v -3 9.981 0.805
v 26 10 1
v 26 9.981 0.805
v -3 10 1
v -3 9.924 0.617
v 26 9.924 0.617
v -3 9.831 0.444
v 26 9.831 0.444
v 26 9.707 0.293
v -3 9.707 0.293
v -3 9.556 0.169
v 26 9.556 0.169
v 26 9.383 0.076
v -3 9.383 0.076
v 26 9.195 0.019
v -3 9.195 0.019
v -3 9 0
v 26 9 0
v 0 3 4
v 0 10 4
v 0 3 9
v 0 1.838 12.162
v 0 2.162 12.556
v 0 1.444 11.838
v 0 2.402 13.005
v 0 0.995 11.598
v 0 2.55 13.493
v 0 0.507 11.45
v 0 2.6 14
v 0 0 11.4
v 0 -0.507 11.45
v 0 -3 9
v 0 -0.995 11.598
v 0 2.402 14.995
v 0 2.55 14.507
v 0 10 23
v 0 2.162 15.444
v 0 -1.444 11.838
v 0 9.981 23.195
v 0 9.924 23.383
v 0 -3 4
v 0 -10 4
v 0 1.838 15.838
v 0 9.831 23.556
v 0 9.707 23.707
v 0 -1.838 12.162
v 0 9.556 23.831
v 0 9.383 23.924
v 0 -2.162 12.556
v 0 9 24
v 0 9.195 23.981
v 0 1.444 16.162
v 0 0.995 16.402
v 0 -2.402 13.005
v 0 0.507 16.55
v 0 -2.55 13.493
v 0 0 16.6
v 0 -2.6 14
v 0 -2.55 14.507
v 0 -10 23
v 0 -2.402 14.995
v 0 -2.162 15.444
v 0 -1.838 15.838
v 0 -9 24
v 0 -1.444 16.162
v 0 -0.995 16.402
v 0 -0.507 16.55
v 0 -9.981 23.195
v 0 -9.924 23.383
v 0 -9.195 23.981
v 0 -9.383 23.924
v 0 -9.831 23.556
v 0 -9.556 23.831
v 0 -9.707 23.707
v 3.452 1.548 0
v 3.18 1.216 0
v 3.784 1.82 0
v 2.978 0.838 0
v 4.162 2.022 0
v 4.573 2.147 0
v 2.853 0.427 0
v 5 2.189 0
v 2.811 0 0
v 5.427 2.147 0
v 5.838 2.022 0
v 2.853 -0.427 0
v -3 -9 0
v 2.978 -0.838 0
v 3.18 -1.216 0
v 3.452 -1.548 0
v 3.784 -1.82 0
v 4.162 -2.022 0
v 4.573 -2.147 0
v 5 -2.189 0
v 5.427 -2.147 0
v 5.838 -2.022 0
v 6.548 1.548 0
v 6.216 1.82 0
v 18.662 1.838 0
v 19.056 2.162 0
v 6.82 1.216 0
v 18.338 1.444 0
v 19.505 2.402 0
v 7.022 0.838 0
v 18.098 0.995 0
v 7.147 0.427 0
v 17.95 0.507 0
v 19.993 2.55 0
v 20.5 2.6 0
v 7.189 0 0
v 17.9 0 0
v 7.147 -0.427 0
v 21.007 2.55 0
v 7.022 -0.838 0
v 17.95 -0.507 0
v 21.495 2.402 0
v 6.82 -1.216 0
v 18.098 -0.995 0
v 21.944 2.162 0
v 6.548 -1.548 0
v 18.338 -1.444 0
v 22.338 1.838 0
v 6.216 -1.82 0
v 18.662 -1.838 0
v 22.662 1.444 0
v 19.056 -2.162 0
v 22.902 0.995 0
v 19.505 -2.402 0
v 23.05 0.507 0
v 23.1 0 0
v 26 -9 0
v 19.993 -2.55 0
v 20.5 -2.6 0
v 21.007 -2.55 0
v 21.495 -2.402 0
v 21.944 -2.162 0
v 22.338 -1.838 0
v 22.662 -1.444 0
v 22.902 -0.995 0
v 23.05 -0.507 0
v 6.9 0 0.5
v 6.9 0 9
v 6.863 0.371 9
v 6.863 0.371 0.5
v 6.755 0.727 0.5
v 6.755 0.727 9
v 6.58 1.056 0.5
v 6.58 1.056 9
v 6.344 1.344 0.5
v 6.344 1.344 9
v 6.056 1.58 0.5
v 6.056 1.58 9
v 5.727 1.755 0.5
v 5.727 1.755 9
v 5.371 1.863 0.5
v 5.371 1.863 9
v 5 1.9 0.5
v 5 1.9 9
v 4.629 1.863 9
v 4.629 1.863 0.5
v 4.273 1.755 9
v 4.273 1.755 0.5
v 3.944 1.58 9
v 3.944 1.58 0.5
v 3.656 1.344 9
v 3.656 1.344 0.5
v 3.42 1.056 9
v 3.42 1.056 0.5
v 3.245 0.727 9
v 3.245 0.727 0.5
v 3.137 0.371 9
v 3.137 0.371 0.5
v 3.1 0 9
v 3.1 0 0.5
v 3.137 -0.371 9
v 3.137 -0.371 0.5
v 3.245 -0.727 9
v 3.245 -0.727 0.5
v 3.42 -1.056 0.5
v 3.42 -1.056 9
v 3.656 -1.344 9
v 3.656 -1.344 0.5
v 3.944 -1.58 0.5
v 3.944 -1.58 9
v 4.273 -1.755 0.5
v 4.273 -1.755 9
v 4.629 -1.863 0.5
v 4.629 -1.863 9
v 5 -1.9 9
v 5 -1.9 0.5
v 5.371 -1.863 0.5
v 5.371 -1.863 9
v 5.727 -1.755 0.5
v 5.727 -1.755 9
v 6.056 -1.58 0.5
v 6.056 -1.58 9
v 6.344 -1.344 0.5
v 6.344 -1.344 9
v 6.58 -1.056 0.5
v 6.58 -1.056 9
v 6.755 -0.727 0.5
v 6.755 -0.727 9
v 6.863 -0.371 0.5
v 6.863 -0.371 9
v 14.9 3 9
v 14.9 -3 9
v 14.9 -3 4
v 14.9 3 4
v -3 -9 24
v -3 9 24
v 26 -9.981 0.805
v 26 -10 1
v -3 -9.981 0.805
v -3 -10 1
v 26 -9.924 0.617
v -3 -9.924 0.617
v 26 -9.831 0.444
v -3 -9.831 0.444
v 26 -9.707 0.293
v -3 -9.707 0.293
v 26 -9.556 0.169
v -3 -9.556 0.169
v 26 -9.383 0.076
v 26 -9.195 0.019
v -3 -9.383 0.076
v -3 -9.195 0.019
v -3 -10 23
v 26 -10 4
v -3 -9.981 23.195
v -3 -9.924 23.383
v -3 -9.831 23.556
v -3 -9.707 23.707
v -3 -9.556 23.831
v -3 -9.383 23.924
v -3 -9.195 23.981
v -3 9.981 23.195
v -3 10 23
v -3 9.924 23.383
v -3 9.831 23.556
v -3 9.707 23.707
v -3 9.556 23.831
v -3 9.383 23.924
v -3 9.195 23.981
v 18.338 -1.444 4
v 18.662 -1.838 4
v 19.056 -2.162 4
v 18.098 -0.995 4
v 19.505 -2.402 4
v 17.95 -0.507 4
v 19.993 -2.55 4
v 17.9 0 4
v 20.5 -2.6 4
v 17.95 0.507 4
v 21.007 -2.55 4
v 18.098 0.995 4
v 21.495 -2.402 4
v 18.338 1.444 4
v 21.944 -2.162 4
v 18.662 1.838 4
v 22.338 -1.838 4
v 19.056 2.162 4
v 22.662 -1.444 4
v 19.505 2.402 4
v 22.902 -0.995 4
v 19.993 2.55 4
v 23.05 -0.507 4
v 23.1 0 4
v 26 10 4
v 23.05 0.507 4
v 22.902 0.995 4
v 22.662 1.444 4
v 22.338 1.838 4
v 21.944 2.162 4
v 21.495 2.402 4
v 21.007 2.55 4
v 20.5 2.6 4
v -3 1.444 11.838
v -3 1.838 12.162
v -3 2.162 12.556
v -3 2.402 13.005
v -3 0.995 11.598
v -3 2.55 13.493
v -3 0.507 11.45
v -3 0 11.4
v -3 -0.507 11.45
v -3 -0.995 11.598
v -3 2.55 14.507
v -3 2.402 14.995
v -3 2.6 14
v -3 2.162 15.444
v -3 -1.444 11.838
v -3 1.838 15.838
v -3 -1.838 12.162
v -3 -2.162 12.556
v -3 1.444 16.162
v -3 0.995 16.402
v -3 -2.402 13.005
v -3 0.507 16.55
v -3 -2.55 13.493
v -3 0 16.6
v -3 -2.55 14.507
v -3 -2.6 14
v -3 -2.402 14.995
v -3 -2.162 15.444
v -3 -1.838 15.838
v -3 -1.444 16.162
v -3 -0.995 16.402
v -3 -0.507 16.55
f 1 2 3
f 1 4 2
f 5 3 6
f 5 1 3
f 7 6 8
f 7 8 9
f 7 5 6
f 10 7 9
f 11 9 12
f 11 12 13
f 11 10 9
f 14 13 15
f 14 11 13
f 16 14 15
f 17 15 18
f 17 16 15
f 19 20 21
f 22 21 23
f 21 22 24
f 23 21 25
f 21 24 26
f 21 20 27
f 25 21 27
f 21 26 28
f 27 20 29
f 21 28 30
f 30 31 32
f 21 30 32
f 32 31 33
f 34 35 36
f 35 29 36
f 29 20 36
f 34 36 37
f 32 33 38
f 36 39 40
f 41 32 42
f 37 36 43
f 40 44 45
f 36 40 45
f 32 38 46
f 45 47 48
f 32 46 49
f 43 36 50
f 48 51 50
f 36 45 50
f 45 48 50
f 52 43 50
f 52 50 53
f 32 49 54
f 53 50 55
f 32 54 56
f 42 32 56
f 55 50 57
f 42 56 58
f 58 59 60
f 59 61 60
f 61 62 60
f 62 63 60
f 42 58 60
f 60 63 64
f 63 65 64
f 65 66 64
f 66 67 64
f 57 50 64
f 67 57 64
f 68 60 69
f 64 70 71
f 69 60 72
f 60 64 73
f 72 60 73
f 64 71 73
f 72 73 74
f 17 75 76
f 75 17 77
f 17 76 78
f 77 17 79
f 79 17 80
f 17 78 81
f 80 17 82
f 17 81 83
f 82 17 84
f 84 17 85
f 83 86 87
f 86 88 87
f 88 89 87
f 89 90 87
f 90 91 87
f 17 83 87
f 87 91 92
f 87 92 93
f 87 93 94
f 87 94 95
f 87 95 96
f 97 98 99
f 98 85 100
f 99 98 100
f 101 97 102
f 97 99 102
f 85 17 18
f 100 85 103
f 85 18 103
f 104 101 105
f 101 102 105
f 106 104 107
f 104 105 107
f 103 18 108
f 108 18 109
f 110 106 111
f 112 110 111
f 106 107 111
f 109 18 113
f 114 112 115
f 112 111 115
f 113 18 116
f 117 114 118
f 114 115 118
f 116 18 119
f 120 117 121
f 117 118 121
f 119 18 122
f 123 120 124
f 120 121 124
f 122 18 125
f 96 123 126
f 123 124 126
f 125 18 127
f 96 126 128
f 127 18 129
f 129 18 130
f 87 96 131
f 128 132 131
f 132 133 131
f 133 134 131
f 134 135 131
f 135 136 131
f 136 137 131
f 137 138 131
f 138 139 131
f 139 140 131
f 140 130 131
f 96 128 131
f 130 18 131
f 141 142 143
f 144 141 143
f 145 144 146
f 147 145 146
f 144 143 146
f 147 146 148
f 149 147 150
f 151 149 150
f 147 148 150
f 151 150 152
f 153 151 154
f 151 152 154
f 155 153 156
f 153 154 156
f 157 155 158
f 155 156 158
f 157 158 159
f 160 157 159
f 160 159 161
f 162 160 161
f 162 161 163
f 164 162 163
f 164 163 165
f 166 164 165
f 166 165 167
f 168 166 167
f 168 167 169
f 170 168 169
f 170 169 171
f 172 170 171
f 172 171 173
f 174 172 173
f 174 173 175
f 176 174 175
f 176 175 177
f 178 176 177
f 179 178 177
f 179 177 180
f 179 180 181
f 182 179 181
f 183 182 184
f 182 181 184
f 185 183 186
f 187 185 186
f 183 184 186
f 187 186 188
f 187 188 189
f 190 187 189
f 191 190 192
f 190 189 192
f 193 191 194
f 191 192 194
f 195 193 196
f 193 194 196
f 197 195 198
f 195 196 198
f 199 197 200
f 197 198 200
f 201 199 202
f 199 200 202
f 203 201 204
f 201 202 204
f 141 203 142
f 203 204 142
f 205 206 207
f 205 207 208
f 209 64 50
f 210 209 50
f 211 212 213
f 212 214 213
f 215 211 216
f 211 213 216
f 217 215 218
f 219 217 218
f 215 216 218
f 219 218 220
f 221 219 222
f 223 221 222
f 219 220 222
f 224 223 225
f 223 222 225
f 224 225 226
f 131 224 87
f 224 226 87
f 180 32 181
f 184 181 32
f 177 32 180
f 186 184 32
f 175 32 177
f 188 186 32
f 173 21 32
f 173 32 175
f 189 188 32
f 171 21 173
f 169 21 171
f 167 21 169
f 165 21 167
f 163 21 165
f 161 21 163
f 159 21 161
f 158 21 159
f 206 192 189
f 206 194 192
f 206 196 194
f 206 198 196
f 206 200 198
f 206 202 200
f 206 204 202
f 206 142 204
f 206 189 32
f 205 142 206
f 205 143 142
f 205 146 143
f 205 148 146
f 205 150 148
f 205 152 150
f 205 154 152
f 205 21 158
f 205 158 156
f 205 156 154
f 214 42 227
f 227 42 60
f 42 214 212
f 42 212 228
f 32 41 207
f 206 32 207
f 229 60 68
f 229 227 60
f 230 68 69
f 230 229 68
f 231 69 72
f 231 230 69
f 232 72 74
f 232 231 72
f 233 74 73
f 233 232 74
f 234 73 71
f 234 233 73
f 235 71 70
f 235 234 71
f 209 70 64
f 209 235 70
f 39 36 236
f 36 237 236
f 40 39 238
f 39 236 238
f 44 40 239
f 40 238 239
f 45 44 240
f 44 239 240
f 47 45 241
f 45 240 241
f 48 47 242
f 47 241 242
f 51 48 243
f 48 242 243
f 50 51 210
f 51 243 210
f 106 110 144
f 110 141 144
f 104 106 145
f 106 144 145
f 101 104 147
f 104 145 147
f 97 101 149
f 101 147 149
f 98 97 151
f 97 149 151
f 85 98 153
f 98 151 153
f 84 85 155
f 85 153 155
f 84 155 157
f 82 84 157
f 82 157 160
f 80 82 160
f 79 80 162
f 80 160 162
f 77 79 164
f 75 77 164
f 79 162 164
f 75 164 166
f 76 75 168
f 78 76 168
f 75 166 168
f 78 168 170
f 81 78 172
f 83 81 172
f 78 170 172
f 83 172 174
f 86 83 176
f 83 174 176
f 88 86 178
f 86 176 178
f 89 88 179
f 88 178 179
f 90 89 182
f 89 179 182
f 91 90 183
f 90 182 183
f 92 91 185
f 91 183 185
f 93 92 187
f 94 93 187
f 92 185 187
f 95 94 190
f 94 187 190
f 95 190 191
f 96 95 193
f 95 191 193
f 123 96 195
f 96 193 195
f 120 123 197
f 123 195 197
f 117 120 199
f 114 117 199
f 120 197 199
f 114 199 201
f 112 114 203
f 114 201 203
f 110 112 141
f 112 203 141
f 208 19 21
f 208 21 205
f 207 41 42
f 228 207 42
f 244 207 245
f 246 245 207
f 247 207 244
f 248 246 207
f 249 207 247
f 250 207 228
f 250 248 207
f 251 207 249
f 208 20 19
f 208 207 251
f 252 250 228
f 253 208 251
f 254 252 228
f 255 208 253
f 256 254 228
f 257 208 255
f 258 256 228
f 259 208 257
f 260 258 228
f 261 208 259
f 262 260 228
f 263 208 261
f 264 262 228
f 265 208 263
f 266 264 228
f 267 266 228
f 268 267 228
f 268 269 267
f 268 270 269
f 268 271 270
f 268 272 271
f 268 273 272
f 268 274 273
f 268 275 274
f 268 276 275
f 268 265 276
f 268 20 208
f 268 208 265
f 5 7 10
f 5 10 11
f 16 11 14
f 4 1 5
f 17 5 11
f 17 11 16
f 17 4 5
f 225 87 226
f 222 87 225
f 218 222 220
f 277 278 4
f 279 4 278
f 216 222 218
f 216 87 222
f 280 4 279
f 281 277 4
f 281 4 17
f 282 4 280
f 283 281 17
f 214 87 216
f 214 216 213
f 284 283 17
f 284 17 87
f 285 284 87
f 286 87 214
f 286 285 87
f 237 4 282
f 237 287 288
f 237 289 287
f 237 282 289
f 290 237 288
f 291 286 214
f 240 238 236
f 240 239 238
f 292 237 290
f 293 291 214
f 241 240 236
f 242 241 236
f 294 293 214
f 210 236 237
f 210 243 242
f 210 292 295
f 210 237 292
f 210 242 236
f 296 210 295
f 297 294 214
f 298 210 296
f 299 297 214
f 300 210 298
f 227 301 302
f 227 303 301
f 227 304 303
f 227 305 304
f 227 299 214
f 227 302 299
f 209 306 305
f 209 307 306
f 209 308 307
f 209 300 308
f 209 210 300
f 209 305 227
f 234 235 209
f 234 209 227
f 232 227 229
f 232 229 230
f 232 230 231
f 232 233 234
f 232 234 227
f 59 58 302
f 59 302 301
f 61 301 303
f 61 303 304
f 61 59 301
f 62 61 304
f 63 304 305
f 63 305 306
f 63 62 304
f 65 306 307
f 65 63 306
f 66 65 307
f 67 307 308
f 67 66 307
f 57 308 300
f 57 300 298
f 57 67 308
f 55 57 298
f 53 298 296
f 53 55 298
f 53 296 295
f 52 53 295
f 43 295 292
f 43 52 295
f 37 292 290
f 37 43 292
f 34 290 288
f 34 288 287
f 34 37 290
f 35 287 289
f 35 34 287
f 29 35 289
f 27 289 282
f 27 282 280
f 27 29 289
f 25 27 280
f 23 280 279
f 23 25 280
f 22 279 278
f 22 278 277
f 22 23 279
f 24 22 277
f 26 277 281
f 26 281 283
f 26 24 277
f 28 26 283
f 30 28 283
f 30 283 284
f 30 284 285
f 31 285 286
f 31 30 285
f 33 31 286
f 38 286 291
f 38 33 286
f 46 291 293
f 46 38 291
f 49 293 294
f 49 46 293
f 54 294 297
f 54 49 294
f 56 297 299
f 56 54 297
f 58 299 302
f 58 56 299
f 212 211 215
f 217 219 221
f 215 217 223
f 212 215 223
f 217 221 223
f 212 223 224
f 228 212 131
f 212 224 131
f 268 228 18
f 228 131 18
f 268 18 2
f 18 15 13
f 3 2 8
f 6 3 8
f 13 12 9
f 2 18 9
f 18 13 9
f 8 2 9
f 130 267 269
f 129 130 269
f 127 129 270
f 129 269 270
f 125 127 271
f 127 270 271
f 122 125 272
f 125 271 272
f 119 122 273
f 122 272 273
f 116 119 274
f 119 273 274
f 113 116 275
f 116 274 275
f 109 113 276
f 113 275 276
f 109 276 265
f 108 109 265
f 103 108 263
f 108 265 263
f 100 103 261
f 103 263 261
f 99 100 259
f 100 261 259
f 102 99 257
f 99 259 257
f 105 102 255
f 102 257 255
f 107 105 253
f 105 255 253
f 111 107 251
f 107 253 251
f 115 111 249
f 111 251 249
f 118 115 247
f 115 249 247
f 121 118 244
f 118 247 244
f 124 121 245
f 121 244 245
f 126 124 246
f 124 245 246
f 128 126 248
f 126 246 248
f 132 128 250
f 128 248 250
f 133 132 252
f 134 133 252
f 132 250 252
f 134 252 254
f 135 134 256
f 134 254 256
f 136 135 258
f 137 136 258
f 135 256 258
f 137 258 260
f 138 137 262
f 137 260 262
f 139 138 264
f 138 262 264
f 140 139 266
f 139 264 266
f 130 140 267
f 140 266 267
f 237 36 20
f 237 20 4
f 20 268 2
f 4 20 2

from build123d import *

# Parameters (mm, degrees)
F0_W      = 26
F0_H      = 20
F1_DEPTH  = 4
F2_W      = 26
F2_H      = 6
F3_DEPTH  = 5
F4_R      = 1.9
F5_DEPTH  = 25
F6_W      = 11.2
F6_H      = 6
F7_DEPTH  = 5
F8_R      = 2.6
F9_DEPTH  = 4
F10_R     = 2.6
F11_DEPTH = 3
F12_R     = 1


# Not quite as in the source:
# - a fillet or chamfer that OpenCascade refuses, or shapes differently, is made with other operations: its cross-section is extruded or revolved along the edge and cut away or added
# - a feature names something its author has since deleted; it is built from what else it names


with BuildPart() as f1:
    # F0 (on Top) → F1 (new body)
    with BuildSketch(Plane.XY):
        with Locations((13, 0)):
            Rectangle(F0_W, F0_H)
    extrude(amount=F1_DEPTH)

    # F2 (on face) → F3 (join)
    with BuildSketch(Plane.XY.offset(4)):
        with Locations((13, 0)):
            Rectangle(F2_W, F2_H)
    extrude(amount=F3_DEPTH)

    # F4 (on face) → F5 (cut)
    with BuildSketch(Plane.XY.offset(9)):
        with Locations((5, 0)):
            Circle(F4_R)
    extrude(amount=-F5_DEPTH, mode=Mode.SUBTRACT)

    # F6 (on face) → F7 (cut, through all)
    with BuildSketch(Plane.XY.offset(9)):
        with Locations((20.5, 0)):
            Rectangle(F6_W, F6_H)
    extrude(amount=-F7_DEPTH, mode=Mode.SUBTRACT)

    # F8 (on face) → F9 (cut, through all)
    with BuildSketch(Plane.XY.offset(4)):
        with Locations((20.5, 0)):
            Circle(F8_R)
    extrude(amount=-F9_DEPTH, mode=Mode.SUBTRACT)

    # F10 (on face) → F11 (join)
    with BuildSketch(Plane(origin=(0, 0, 0), x_dir=(0, -1, 0), z_dir=(-1, 0, 0))):
        Polygon((-10, 24), (-10, 4), (-3, 4), (-3, 9), (3, 9), (3, 4), (10, 4), (10, 24), align=None)
        with Locations((0, 14)):
            Circle(F10_R, mode=Mode.SUBTRACT)
        Polygon((-10, 4), (-10, 0), (10, 0), (10, 4), (3, 4), (3, 9), (-3, 9), (-3, 4), align=None)
    extrude(amount=F11_DEPTH)

    # F12
    f12_edges = [f1.edges().sort_by_distance(p)[0] for p in [
        (-1.5, -10, 24),
        (-1.5, 10, 24),
        (11.5, -10, 0),
        (11.5, 10, 0),
    ]]
    fillet(f12_edges, radius=F12_R)

    # F13: chamfer of 0.5 x 0.2886751346 on 1 edges, made by hand

    # F13_s1 → F13_t2 (revolve, cut)
    with BuildSketch(Plane.XZ):
        Polygon((7.1886751346, 0), (6.9, 0.5), (6.9, 0), align=None)
    revolve(axis=Axis((5, 0, 0), (0, 0, 1)), mode=Mode.SUBTRACT)


solid = f1.part
